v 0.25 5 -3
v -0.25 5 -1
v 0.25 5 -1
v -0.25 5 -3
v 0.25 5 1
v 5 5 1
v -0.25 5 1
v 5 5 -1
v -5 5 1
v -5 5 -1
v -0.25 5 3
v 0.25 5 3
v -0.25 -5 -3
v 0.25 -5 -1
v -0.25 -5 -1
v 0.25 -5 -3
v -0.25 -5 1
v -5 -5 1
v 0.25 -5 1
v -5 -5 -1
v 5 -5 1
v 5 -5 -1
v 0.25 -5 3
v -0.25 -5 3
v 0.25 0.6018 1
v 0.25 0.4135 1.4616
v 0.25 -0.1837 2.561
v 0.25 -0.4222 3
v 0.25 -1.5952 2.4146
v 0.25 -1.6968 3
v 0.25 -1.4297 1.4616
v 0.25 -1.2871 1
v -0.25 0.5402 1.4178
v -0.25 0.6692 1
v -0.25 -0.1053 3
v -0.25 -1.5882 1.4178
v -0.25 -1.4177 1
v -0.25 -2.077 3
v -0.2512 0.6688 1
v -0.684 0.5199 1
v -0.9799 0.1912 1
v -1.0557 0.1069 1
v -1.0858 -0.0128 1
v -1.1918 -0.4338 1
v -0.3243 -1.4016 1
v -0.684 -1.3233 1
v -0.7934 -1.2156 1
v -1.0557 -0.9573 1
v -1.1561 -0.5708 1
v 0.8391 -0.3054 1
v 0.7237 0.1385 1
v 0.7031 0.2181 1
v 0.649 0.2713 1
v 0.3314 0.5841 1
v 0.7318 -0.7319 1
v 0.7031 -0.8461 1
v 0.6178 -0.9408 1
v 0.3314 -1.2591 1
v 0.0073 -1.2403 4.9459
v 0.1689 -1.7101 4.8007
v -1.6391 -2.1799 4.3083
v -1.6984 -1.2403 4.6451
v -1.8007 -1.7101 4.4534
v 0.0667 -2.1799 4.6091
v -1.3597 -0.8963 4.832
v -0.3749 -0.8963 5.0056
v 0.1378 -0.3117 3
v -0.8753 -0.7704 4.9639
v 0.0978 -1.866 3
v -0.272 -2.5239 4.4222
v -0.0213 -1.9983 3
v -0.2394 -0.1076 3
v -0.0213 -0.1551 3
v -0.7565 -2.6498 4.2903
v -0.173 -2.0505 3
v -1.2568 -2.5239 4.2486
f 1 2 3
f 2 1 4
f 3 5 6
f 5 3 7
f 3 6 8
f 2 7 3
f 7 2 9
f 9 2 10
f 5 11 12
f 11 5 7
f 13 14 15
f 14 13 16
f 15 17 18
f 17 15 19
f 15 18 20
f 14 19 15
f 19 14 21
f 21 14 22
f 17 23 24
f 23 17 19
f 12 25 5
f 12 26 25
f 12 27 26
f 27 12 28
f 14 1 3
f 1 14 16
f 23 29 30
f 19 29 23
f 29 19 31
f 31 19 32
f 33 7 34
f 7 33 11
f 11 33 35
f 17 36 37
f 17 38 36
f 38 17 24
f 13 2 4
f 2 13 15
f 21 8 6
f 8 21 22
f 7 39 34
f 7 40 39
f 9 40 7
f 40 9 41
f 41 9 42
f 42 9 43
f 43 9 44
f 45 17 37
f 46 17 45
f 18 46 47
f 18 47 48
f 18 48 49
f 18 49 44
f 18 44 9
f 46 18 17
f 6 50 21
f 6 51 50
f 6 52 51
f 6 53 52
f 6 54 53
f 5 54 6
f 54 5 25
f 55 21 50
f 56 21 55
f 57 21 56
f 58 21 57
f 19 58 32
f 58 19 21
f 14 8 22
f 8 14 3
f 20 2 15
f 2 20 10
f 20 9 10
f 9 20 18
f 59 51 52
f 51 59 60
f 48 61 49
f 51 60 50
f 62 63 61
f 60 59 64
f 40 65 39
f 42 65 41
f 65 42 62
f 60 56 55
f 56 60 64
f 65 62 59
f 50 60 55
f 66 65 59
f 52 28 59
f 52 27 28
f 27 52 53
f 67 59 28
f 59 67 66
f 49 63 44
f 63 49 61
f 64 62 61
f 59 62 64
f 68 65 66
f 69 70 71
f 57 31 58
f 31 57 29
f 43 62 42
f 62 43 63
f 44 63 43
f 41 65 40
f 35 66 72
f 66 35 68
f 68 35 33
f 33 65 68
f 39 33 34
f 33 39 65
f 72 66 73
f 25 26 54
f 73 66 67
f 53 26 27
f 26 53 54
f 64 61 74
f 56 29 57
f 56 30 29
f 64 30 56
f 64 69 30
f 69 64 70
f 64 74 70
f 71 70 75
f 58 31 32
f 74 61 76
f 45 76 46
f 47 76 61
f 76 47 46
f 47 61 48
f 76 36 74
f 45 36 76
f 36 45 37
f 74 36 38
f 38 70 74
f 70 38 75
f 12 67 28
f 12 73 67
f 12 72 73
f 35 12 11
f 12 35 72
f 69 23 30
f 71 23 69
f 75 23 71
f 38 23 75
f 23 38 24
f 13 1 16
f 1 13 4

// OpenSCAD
    ////////////////////////////////////////////////////////
    /*
    unionRound() 1.0 Module by Torleif Ceder - TLC123 late summer 2021
     Pretty fast Union with radius, But limited to a subset of cases
    Usage 
     unionRound( radius , detail  )
        {
         YourObject1();
         YourObject2(); 
        } 
      unionRoundMask (r, detail , epsilon ,showMask )
        {
         YourObject1();
         YourObject2(); 
         YourMask();
         YourMask();  // multimask not implemented
         
         // ...
         // ...
         // ...
         
        } 
    limitations: 
     0. Only really fast when boolean operands are convex, 
            Minkowski is fast in that case. 
     1. Boolean operands may be concave but can only touch 
            in a single convex area
     2. Radius is of elliptic type and is only approximate r
            were operand intersect at perpendicular angle. 
    */
    //////////////////////////////////////////////////////// 
    // Demo code
    demo= true;
    if (demo)  
     unionRoundMask(1.5, 5) {
     cube([10,10,2],true);
     rotate([20,-10,0])cylinder(5,1,1,$fn=12);   
     cube([.5,10,6],center=true); //mask
    }
    
    // end of demo code
    //
    // todo multi-mask iteraation
      module unionRoundMask(r, detail = 5,  epsilon = 1e-6,showMask=true) {
            children(0);
            children(1);
            if(showMask)#children(2);
          intersection(){
                 children(2);
                 unionRound(r, detail,  epsilon ) {
                    intersection(){
                        children(0);
                        children(2); // mask
                       }
                    intersection(){
                        children(1);
                        children(2);// mask
                       }  
              }
          }
       }
    
    
    
    module unionRound(r, detail = 5,  epsilon = 1e-6) {
        
        children(0);
        children(1);
        step = 90 / detail;
      for (i = [0:  detail-1]) {
            {
                x = r - sin(i * step ) * r;
                y = r - cos(i * step ) * r;
                xi = r - sin((i * step + step)  ) * r;
                yi = r - cos((i * step + step)  ) * r;
                color(rands(0, 1, 3, i))
                hull() {
                    intersection() {
                        // shell(epsilon) 
                        clad(x) children(0);
                        // shell(epsilon) 
                        clad(y) children(1);
                    }
                    intersection() {
                        // shell(epsilon) 
                        clad(xi) children(0);
                        // shell(epsilon) 
                        clad(yi) children(1);
                    }
                }
            }
        }
    }
    // unionRound helper expand by r
    module clad(r) {
        minkowski() {
            children();
            //        icosphere(r,2);
             isosphere(r,70); 
        }
    }
    // unionRound helper
    module shell(r) {
        difference() {
            clad(r) children();
            children();
        }
    }
    /*    
    // The following is a sphere with some equidistant properties.
    // Not strictly necessary

    Kogan, Jonathan (2017) "A New Computationally Efficient Method for Spacing n Points on a Sphere," Rose-Hulman Undergraduate Mathematics Journal: Vol. 18 : Iss. 2 , Article 5.
    Available at: https://scholar.rose-hulman.edu/rhumj/vol18/iss2/5 */
    
    function sphericalcoordinate(x,y)=  [cos(x  )*cos(y  ), sin(x  )*cos(y  ), sin(y  )];
    function NX(n,x)= 
    let(toDeg=57.2958,PI=acos(-1)/toDeg,
    start=(-1.+1./(n-1.)),increment=(2.-2./(n-1.))/(n-1.) )
    [ for (j= [0:n-1])let (s=start+j*increment )
    sphericalcoordinate(   s*x*toDeg,  PI/2.* sign(s)*(1.-sqrt(1.-abs(s)))*toDeg)];
    function generatepoints(n)= NX(n,0.1+1.2*n);
    module isosphere(r,detail){
    a= generatepoints(detail);
    scale(r)hull()polyhedron(a,[[for(i=[0:len(a)-1])i]]);
    }
